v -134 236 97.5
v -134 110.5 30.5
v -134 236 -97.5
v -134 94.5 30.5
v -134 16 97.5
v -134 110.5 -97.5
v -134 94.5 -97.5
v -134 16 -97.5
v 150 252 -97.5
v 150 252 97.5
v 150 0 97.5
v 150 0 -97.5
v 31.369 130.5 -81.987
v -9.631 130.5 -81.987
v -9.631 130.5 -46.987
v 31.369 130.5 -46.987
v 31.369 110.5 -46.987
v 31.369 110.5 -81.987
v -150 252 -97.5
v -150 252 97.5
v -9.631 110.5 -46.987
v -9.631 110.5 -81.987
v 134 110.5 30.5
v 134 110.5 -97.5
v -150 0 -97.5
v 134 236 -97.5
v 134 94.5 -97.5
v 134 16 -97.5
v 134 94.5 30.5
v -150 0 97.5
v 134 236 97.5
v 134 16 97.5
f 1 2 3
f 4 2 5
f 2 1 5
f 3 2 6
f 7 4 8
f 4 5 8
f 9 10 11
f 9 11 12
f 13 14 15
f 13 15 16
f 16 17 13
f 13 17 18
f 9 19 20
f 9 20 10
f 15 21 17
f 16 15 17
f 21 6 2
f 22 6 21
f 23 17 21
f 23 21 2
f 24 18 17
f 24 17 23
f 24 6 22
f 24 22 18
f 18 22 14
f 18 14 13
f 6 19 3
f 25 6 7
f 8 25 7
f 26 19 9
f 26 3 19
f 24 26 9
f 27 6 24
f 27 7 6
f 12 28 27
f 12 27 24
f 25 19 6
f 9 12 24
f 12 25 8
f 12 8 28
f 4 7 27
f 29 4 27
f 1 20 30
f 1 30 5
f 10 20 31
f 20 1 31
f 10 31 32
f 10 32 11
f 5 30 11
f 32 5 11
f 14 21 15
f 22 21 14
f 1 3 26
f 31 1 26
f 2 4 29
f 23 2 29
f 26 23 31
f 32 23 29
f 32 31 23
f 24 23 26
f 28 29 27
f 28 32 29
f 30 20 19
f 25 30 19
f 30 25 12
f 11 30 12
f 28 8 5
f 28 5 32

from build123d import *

# Parameters (mm, degrees)
CROQUIS1_W              = 300
CROQUIS1_H              = 195
SALIENTE_EXTRUIR1_DEPTH = 16
CROQUIS2_W              = 16
CROQUIS2_H              = 195
SALIENTE_EXTRUIR2_DEPTH = 220
CROQUIS7_W              = 300
CROQUIS7_H              = 195
SALIENTE_EXTRUIR4_DEPTH = 16
CROQUIS8_W              = 268
CROQUIS8_H              = 128
SALIENTE_EXTRUIR5_DEPTH = 16
CROQUIS11_W             = 41
CROQUIS11_H             = 35
SALIENTE_EXTRUIR6_DEPTH = 20


with BuildPart() as part:
    # Croquis1 → Saliente-Extruir1 (new body)
    with BuildSketch(Plane(origin=(0, 0, 0), x_dir=(1, 0, 0), z_dir=(0, 1, 0))):
        Rectangle(CROQUIS1_W, CROQUIS1_H)
    extrude(amount=SALIENTE_EXTRUIR1_DEPTH)

    # Croquis2 → Saliente-Extruir2 (add)
    with BuildSketch(Plane(origin=(0, 16, 0), x_dir=(1, 0, 0), z_dir=(0, 1, 0))):
        with Locations((-142, 0)):
            Rectangle(CROQUIS2_W, CROQUIS2_H)
        with Locations((142, 0)):
            Rectangle(CROQUIS2_W, CROQUIS2_H)
    extrude(amount=SALIENTE_EXTRUIR2_DEPTH)

    # Croquis7 → Saliente-Extruir4 (add)
    with BuildSketch(Plane(origin=(0, 236, 0), x_dir=(1, 0, 0), z_dir=(0, 1, 0))):
        Rectangle(CROQUIS7_W, CROQUIS7_H)
    extrude(amount=SALIENTE_EXTRUIR4_DEPTH)

    # Croquis8 → Saliente-Extruir5 (add)
    with BuildSketch(Plane(origin=(0, 94.5, 0), x_dir=(1, 0, 0), z_dir=(0, 1, 0))):
        with Locations((0, 33.5)):
            Rectangle(CROQUIS8_W, CROQUIS8_H)
    extrude(amount=SALIENTE_EXTRUIR5_DEPTH)

    # Croquis11 → Saliente-Extruir6 (add)
    with BuildSketch(Plane(origin=(0, 110.5, 0), x_dir=(1, 0, 0), z_dir=(0, 1, 0))):
        with Locations((10.868818232, 64.486978539)):
            Rectangle(CROQUIS11_W, CROQUIS11_H)
    extrude(amount=SALIENTE_EXTRUIR6_DEPTH)


solid = part.part
